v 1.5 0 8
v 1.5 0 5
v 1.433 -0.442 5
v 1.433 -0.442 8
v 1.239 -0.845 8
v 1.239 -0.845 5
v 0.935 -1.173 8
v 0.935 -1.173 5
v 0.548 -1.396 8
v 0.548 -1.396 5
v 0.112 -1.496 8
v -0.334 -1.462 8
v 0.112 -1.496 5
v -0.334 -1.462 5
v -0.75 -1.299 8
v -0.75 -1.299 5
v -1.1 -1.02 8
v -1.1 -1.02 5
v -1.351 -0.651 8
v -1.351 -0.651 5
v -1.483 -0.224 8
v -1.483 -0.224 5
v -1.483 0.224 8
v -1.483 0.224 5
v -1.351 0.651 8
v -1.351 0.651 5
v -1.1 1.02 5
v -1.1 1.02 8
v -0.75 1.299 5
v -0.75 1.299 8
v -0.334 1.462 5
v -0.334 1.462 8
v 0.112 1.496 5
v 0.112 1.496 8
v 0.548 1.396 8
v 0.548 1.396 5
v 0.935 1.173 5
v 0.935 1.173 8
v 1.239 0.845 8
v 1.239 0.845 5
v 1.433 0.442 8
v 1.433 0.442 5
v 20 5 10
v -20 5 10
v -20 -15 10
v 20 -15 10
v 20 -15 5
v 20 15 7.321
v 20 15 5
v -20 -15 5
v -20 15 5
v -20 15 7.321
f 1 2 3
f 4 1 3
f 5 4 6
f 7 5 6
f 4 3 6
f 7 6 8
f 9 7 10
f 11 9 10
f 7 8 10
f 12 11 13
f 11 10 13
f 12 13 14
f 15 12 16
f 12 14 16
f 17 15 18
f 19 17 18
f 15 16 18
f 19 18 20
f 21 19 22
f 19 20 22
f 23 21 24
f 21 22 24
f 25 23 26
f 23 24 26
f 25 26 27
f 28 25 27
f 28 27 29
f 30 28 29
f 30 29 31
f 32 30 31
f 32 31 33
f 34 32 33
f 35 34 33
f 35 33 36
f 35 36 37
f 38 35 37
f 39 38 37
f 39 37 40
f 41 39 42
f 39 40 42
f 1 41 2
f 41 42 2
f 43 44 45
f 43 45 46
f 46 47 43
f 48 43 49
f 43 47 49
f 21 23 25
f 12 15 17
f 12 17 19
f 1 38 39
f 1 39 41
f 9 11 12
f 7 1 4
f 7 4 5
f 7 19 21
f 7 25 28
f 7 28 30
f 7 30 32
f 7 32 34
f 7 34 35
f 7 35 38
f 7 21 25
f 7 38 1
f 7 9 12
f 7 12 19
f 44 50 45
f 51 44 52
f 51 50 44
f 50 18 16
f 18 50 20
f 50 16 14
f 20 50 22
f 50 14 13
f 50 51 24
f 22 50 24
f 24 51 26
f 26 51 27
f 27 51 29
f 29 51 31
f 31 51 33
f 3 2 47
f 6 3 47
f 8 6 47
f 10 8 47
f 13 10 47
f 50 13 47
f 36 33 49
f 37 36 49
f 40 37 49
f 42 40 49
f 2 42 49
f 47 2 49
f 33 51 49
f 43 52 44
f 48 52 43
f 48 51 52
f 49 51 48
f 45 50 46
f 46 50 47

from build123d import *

# Parameters (mm, degrees)
F0_R     = 1.25
F1_DEPTH = 5
F2_W     = 40
F2_H     = 30
F3_DEPTH = 5
F4_SIZE2 = 2.6794919243
F4_SIZE  = 10
F5_DEPTH = 5
F6_R     = 1.5
F7_DEPTH = 3


with BuildPart() as f1:
    # F0 (on Top) → F1 (new body)
    with BuildSketch(Plane.XY):
        Circle(F0_R)
    extrude(amount=F1_DEPTH)

    # F2 (on face) → F3 (join)
    with BuildSketch(Plane.XY.offset(5)):
        Rectangle(F2_W, F2_H)
    extrude(amount=F3_DEPTH)

    # F4
    f4_edges = [f1.edges().sort_by_distance(p)[0] for p in [
        (0, 15, 10),
    ]]
    f4_side = f1.faces().sort_by_distance((0, 0, 10))[0]
    chamfer(f4_edges, length=F4_SIZE, length2=F4_SIZE2, reference=f4_side)

    # F5 (cut): a face of the model
    f5_faces = [f1.faces().sort_by_distance(p)[0] for p in [
        (0, 0, 0),
    ]]
    extrude(f5_faces, amount=-F5_DEPTH, mode=Mode.SUBTRACT)

    # F6 (on face) → F7 (cut)
    with BuildSketch(Plane(origin=(0, 0, 5), x_dir=(1, 0, 0), z_dir=(0, 0, -1))):
        Circle(F6_R)
    extrude(amount=-F7_DEPTH, mode=Mode.SUBTRACT)


solid = f1.part
